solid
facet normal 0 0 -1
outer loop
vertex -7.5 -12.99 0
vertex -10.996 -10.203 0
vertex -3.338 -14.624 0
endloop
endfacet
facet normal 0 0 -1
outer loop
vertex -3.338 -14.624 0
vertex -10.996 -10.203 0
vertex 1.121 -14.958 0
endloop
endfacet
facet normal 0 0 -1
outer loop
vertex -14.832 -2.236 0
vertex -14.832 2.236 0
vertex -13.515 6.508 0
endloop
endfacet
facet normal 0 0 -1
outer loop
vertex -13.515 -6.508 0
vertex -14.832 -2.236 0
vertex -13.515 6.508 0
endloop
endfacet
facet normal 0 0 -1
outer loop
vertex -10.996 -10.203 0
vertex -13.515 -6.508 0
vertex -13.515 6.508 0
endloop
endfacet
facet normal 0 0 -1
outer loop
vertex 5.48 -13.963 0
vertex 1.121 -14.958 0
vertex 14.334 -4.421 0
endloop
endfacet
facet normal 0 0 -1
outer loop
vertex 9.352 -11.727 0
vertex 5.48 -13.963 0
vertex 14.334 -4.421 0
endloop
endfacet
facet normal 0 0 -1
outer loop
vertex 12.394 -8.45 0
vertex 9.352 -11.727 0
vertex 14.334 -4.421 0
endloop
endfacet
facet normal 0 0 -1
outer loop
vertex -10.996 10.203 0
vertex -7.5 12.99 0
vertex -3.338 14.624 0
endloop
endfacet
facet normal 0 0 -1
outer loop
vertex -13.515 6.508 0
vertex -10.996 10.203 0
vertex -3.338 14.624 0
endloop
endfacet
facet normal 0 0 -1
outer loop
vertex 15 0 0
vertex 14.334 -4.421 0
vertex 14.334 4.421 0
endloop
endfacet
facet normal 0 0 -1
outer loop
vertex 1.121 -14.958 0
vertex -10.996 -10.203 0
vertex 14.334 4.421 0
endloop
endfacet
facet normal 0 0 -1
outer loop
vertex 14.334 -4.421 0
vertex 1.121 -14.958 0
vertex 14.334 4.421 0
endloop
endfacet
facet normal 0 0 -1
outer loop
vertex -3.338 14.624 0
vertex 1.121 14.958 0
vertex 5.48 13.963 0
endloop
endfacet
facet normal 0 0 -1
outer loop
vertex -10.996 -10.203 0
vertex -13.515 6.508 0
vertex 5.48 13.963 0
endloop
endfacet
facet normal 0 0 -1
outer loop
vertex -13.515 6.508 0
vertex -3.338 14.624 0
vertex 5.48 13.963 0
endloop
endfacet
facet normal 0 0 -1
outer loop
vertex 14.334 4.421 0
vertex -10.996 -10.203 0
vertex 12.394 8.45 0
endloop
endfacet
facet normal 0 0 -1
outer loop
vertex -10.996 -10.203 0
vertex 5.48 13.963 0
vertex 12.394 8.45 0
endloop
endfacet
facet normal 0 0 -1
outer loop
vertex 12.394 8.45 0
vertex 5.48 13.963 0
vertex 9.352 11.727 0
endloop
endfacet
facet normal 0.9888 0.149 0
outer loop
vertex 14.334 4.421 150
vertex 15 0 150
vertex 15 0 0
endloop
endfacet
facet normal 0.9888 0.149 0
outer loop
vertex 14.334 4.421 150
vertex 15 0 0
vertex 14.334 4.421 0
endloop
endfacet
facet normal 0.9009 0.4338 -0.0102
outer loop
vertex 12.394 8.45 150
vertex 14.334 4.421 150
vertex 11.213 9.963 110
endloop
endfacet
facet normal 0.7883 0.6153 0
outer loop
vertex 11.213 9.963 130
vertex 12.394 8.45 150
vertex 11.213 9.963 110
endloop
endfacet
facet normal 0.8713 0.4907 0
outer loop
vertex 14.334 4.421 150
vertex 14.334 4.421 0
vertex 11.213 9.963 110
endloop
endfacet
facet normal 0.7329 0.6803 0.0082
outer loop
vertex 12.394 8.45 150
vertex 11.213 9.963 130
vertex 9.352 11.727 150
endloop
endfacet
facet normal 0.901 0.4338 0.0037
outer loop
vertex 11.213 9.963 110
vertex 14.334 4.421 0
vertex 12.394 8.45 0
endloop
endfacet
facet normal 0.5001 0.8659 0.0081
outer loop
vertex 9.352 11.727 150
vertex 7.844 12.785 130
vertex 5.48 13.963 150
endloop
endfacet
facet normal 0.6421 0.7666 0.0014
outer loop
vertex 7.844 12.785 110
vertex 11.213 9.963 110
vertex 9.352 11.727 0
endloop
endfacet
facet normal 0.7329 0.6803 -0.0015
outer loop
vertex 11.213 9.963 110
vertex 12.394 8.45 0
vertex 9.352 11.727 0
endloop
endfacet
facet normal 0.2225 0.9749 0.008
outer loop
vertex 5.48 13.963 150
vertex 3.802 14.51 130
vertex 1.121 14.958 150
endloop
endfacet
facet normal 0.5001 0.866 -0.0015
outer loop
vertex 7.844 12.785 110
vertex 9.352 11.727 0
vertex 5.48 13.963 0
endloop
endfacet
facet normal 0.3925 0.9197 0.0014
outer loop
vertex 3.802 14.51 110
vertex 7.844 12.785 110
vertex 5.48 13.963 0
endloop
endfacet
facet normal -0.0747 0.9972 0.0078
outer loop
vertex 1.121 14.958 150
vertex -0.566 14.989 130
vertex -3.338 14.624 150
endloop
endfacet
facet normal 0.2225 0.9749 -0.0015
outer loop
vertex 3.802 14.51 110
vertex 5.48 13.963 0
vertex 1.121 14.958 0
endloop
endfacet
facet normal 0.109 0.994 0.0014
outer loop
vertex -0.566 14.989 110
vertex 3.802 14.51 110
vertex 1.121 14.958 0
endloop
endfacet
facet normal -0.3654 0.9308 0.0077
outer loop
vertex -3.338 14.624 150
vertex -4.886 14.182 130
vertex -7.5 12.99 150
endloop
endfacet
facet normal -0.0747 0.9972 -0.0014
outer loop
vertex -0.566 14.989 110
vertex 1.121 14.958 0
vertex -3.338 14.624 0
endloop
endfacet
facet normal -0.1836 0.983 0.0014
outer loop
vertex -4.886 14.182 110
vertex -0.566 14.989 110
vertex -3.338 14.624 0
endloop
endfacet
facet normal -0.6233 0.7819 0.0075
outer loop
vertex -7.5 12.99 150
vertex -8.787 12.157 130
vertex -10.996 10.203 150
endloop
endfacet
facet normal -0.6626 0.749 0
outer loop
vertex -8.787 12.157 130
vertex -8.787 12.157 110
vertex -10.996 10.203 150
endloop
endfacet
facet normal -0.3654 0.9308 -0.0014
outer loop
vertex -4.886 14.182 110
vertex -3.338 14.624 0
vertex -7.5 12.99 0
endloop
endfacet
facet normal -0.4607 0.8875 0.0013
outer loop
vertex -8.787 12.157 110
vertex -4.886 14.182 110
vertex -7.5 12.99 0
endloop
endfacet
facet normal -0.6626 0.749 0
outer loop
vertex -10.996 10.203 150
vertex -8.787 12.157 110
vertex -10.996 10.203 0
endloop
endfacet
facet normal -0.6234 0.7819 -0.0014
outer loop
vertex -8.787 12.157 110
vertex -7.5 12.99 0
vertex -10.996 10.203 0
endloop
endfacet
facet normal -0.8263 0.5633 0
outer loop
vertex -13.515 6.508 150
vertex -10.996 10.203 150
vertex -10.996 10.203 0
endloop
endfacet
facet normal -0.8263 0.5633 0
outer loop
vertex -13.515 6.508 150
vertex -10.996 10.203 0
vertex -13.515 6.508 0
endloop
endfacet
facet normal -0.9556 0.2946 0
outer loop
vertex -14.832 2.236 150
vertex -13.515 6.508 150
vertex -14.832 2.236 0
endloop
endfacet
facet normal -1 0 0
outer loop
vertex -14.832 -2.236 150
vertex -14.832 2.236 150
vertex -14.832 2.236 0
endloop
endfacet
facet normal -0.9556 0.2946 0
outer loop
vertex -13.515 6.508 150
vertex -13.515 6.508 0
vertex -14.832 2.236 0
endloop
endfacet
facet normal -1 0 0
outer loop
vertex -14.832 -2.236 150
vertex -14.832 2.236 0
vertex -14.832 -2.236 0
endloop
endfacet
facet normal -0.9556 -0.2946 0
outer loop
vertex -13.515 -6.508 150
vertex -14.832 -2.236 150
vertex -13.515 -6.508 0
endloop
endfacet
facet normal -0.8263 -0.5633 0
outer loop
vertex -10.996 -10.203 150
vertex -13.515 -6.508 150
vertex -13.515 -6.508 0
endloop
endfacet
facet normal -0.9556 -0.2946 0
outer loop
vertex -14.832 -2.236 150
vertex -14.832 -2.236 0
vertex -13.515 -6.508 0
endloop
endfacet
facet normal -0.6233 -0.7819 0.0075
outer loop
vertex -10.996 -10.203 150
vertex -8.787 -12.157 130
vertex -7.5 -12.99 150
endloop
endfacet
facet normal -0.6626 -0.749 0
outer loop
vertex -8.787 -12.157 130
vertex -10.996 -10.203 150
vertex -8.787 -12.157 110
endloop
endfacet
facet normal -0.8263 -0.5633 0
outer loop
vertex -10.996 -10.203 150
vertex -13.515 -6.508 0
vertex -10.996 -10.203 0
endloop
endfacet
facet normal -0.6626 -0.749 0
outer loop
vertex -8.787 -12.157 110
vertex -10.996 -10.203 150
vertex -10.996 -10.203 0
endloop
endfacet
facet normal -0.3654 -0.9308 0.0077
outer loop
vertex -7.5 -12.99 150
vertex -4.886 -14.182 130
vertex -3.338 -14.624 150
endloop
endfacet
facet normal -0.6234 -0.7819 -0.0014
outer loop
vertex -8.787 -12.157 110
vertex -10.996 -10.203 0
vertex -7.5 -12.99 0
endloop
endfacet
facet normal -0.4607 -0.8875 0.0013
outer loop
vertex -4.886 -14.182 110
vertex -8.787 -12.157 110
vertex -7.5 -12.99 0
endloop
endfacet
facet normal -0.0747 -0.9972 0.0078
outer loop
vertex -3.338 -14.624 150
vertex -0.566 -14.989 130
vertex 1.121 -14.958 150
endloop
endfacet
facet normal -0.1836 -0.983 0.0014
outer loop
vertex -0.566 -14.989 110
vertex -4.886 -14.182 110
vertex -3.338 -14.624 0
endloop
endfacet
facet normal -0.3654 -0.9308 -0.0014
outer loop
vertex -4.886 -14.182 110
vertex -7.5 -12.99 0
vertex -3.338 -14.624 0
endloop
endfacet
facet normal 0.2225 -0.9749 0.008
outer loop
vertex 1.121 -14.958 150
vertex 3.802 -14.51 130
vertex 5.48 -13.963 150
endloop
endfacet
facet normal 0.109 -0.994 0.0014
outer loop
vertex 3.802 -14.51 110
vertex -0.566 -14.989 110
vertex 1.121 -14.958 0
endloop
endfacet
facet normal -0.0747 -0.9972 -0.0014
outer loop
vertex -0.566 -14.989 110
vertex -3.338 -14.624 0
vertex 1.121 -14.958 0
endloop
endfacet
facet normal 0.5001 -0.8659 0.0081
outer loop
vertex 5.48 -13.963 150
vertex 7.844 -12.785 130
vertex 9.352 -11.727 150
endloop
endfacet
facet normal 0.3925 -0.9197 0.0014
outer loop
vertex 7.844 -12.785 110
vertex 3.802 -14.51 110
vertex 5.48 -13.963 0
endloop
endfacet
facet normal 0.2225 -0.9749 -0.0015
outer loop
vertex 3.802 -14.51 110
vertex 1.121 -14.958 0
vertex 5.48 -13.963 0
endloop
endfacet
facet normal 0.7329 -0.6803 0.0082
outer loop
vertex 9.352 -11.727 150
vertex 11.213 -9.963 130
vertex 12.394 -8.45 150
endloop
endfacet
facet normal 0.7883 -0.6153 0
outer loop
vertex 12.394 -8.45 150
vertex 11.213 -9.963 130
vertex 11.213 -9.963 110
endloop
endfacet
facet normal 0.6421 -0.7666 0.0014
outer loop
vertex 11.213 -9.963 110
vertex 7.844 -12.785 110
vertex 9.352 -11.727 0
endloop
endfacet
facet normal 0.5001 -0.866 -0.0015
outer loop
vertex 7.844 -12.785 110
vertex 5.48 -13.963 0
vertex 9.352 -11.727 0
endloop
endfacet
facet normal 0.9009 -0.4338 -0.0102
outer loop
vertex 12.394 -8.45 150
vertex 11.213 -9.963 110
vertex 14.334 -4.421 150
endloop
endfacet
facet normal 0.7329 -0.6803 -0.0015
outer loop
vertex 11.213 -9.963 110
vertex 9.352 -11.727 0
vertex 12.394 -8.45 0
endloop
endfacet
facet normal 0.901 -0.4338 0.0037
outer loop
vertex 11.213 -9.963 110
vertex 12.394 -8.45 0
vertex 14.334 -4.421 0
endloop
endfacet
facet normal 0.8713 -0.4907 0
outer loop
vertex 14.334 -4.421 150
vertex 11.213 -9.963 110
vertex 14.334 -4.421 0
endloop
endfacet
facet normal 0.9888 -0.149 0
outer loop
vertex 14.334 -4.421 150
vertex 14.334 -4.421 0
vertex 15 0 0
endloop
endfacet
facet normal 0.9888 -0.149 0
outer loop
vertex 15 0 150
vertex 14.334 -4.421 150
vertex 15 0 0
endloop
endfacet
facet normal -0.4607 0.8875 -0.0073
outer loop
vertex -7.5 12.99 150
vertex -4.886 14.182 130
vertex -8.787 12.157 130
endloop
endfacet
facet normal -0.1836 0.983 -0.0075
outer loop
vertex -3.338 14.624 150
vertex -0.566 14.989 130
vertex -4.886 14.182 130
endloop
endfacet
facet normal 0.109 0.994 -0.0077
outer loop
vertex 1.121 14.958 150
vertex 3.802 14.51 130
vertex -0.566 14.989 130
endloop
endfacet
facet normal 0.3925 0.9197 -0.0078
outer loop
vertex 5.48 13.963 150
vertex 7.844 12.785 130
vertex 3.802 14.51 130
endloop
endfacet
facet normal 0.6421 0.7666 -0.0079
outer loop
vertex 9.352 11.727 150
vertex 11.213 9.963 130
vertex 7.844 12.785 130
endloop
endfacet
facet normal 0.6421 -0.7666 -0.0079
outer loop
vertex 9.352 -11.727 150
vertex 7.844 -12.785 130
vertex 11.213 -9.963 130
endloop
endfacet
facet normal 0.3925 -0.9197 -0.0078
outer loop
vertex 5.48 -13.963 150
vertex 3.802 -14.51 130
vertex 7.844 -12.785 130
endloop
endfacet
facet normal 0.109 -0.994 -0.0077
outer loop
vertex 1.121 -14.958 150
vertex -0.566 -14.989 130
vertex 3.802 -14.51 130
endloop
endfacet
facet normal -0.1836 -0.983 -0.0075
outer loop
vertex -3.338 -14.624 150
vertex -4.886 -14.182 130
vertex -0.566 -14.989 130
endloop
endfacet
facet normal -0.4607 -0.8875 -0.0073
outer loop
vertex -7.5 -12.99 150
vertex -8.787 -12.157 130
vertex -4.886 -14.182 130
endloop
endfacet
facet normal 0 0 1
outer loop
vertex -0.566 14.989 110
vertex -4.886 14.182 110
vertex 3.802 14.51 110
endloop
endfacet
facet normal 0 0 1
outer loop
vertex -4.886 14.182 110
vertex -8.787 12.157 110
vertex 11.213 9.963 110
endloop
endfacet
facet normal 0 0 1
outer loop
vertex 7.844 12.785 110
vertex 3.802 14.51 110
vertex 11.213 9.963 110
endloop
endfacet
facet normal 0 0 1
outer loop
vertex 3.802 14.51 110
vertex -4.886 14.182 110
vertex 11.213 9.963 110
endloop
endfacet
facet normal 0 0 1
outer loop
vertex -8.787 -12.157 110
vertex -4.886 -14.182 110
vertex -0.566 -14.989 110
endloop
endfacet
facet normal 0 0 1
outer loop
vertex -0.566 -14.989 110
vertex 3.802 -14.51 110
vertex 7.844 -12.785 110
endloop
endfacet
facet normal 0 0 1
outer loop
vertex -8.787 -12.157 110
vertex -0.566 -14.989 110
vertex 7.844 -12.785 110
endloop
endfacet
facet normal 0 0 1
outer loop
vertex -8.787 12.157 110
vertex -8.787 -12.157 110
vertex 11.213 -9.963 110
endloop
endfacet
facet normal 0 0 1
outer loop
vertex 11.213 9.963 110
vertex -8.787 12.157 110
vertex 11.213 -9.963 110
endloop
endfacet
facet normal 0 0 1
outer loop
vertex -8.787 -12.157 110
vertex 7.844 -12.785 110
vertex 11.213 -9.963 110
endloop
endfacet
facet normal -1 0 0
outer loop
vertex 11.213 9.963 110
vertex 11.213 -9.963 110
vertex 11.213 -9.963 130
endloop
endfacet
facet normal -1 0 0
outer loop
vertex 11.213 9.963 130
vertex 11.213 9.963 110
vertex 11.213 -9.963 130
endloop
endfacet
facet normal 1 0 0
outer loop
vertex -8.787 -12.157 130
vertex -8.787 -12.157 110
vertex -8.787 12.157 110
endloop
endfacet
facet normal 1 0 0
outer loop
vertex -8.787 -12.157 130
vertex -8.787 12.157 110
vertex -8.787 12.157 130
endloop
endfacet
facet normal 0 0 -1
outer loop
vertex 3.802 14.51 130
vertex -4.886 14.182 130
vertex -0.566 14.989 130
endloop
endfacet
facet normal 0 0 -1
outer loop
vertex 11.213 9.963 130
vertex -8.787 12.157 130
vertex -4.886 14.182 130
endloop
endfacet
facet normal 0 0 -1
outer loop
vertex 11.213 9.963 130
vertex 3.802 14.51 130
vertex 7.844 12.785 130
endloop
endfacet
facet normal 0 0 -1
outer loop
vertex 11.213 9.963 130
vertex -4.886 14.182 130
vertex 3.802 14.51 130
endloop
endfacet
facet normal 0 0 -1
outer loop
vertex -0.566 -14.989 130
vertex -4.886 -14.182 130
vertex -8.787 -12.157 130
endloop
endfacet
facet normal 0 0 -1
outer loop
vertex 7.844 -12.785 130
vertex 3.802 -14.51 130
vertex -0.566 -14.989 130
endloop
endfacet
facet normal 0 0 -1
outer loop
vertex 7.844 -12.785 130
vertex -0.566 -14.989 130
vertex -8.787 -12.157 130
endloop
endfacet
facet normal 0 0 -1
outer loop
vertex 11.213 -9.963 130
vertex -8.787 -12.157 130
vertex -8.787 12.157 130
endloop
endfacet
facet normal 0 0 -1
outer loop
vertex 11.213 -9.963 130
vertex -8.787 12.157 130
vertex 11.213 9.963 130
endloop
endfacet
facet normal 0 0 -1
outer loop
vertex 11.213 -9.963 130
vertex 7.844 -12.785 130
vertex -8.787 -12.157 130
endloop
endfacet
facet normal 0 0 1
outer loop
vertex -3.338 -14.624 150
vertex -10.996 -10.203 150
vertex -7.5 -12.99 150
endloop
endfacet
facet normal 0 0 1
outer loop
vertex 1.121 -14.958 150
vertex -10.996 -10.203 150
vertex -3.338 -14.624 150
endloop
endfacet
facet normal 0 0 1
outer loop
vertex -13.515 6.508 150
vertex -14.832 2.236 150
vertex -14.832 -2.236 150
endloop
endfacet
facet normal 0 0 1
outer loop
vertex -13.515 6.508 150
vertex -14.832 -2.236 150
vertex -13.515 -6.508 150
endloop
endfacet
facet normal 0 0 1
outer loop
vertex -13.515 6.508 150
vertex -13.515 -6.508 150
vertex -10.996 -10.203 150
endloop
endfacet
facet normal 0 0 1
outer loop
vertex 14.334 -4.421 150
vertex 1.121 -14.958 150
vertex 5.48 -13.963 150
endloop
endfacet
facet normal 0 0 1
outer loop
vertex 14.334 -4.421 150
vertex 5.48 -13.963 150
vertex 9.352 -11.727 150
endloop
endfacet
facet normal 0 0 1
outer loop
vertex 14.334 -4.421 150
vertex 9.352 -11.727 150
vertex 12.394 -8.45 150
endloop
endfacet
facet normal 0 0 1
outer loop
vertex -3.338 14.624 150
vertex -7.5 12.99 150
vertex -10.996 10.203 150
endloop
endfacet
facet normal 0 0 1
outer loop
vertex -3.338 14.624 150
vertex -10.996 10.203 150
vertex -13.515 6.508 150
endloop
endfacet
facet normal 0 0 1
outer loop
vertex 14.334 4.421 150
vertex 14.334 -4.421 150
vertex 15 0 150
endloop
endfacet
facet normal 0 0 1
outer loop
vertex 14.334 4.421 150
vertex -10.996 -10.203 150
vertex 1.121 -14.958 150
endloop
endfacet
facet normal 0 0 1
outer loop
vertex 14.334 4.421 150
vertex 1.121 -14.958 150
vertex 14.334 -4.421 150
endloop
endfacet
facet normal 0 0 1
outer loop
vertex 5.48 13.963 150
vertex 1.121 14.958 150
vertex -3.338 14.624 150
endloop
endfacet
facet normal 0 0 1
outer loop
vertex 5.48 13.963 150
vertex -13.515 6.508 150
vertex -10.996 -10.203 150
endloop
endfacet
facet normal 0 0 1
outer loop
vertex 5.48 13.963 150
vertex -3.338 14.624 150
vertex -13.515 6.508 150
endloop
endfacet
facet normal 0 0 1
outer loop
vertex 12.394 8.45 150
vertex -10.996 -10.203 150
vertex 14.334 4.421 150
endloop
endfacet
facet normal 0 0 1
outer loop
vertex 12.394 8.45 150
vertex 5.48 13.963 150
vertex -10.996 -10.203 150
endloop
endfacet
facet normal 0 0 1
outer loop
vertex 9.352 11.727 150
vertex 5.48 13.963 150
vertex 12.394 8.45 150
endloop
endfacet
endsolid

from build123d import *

# Parameters (mm, degrees)
F0_R     = 15
F1_DEPTH = 150
F2_W     = 20
F2_H     = 20
F3_DEPTH = 15.001
F4_DEPTH = 15.001


with BuildPart() as f1:
    # F0 (on Top) → F1 (new body)
    with BuildSketch(Plane.XY):
        Circle(F0_R)
    extrude(amount=F1_DEPTH)

    # F2 (on Front) → F3 (cut, through all)
    with BuildSketch(Plane.XZ):
        with Locations((1.2132771455, 120)):
            Rectangle(F2_W, F2_H)
    extrude(amount=-F3_DEPTH, mode=Mode.SUBTRACT)

    # F2 (on Front) → F4 (cut, through all)
    with BuildSketch(Plane.XZ):
        with Locations((1.2132771455, 120)):
            Rectangle(F2_W, F2_H)
    extrude(amount=F4_DEPTH, mode=Mode.SUBTRACT)


solid = f1.part
